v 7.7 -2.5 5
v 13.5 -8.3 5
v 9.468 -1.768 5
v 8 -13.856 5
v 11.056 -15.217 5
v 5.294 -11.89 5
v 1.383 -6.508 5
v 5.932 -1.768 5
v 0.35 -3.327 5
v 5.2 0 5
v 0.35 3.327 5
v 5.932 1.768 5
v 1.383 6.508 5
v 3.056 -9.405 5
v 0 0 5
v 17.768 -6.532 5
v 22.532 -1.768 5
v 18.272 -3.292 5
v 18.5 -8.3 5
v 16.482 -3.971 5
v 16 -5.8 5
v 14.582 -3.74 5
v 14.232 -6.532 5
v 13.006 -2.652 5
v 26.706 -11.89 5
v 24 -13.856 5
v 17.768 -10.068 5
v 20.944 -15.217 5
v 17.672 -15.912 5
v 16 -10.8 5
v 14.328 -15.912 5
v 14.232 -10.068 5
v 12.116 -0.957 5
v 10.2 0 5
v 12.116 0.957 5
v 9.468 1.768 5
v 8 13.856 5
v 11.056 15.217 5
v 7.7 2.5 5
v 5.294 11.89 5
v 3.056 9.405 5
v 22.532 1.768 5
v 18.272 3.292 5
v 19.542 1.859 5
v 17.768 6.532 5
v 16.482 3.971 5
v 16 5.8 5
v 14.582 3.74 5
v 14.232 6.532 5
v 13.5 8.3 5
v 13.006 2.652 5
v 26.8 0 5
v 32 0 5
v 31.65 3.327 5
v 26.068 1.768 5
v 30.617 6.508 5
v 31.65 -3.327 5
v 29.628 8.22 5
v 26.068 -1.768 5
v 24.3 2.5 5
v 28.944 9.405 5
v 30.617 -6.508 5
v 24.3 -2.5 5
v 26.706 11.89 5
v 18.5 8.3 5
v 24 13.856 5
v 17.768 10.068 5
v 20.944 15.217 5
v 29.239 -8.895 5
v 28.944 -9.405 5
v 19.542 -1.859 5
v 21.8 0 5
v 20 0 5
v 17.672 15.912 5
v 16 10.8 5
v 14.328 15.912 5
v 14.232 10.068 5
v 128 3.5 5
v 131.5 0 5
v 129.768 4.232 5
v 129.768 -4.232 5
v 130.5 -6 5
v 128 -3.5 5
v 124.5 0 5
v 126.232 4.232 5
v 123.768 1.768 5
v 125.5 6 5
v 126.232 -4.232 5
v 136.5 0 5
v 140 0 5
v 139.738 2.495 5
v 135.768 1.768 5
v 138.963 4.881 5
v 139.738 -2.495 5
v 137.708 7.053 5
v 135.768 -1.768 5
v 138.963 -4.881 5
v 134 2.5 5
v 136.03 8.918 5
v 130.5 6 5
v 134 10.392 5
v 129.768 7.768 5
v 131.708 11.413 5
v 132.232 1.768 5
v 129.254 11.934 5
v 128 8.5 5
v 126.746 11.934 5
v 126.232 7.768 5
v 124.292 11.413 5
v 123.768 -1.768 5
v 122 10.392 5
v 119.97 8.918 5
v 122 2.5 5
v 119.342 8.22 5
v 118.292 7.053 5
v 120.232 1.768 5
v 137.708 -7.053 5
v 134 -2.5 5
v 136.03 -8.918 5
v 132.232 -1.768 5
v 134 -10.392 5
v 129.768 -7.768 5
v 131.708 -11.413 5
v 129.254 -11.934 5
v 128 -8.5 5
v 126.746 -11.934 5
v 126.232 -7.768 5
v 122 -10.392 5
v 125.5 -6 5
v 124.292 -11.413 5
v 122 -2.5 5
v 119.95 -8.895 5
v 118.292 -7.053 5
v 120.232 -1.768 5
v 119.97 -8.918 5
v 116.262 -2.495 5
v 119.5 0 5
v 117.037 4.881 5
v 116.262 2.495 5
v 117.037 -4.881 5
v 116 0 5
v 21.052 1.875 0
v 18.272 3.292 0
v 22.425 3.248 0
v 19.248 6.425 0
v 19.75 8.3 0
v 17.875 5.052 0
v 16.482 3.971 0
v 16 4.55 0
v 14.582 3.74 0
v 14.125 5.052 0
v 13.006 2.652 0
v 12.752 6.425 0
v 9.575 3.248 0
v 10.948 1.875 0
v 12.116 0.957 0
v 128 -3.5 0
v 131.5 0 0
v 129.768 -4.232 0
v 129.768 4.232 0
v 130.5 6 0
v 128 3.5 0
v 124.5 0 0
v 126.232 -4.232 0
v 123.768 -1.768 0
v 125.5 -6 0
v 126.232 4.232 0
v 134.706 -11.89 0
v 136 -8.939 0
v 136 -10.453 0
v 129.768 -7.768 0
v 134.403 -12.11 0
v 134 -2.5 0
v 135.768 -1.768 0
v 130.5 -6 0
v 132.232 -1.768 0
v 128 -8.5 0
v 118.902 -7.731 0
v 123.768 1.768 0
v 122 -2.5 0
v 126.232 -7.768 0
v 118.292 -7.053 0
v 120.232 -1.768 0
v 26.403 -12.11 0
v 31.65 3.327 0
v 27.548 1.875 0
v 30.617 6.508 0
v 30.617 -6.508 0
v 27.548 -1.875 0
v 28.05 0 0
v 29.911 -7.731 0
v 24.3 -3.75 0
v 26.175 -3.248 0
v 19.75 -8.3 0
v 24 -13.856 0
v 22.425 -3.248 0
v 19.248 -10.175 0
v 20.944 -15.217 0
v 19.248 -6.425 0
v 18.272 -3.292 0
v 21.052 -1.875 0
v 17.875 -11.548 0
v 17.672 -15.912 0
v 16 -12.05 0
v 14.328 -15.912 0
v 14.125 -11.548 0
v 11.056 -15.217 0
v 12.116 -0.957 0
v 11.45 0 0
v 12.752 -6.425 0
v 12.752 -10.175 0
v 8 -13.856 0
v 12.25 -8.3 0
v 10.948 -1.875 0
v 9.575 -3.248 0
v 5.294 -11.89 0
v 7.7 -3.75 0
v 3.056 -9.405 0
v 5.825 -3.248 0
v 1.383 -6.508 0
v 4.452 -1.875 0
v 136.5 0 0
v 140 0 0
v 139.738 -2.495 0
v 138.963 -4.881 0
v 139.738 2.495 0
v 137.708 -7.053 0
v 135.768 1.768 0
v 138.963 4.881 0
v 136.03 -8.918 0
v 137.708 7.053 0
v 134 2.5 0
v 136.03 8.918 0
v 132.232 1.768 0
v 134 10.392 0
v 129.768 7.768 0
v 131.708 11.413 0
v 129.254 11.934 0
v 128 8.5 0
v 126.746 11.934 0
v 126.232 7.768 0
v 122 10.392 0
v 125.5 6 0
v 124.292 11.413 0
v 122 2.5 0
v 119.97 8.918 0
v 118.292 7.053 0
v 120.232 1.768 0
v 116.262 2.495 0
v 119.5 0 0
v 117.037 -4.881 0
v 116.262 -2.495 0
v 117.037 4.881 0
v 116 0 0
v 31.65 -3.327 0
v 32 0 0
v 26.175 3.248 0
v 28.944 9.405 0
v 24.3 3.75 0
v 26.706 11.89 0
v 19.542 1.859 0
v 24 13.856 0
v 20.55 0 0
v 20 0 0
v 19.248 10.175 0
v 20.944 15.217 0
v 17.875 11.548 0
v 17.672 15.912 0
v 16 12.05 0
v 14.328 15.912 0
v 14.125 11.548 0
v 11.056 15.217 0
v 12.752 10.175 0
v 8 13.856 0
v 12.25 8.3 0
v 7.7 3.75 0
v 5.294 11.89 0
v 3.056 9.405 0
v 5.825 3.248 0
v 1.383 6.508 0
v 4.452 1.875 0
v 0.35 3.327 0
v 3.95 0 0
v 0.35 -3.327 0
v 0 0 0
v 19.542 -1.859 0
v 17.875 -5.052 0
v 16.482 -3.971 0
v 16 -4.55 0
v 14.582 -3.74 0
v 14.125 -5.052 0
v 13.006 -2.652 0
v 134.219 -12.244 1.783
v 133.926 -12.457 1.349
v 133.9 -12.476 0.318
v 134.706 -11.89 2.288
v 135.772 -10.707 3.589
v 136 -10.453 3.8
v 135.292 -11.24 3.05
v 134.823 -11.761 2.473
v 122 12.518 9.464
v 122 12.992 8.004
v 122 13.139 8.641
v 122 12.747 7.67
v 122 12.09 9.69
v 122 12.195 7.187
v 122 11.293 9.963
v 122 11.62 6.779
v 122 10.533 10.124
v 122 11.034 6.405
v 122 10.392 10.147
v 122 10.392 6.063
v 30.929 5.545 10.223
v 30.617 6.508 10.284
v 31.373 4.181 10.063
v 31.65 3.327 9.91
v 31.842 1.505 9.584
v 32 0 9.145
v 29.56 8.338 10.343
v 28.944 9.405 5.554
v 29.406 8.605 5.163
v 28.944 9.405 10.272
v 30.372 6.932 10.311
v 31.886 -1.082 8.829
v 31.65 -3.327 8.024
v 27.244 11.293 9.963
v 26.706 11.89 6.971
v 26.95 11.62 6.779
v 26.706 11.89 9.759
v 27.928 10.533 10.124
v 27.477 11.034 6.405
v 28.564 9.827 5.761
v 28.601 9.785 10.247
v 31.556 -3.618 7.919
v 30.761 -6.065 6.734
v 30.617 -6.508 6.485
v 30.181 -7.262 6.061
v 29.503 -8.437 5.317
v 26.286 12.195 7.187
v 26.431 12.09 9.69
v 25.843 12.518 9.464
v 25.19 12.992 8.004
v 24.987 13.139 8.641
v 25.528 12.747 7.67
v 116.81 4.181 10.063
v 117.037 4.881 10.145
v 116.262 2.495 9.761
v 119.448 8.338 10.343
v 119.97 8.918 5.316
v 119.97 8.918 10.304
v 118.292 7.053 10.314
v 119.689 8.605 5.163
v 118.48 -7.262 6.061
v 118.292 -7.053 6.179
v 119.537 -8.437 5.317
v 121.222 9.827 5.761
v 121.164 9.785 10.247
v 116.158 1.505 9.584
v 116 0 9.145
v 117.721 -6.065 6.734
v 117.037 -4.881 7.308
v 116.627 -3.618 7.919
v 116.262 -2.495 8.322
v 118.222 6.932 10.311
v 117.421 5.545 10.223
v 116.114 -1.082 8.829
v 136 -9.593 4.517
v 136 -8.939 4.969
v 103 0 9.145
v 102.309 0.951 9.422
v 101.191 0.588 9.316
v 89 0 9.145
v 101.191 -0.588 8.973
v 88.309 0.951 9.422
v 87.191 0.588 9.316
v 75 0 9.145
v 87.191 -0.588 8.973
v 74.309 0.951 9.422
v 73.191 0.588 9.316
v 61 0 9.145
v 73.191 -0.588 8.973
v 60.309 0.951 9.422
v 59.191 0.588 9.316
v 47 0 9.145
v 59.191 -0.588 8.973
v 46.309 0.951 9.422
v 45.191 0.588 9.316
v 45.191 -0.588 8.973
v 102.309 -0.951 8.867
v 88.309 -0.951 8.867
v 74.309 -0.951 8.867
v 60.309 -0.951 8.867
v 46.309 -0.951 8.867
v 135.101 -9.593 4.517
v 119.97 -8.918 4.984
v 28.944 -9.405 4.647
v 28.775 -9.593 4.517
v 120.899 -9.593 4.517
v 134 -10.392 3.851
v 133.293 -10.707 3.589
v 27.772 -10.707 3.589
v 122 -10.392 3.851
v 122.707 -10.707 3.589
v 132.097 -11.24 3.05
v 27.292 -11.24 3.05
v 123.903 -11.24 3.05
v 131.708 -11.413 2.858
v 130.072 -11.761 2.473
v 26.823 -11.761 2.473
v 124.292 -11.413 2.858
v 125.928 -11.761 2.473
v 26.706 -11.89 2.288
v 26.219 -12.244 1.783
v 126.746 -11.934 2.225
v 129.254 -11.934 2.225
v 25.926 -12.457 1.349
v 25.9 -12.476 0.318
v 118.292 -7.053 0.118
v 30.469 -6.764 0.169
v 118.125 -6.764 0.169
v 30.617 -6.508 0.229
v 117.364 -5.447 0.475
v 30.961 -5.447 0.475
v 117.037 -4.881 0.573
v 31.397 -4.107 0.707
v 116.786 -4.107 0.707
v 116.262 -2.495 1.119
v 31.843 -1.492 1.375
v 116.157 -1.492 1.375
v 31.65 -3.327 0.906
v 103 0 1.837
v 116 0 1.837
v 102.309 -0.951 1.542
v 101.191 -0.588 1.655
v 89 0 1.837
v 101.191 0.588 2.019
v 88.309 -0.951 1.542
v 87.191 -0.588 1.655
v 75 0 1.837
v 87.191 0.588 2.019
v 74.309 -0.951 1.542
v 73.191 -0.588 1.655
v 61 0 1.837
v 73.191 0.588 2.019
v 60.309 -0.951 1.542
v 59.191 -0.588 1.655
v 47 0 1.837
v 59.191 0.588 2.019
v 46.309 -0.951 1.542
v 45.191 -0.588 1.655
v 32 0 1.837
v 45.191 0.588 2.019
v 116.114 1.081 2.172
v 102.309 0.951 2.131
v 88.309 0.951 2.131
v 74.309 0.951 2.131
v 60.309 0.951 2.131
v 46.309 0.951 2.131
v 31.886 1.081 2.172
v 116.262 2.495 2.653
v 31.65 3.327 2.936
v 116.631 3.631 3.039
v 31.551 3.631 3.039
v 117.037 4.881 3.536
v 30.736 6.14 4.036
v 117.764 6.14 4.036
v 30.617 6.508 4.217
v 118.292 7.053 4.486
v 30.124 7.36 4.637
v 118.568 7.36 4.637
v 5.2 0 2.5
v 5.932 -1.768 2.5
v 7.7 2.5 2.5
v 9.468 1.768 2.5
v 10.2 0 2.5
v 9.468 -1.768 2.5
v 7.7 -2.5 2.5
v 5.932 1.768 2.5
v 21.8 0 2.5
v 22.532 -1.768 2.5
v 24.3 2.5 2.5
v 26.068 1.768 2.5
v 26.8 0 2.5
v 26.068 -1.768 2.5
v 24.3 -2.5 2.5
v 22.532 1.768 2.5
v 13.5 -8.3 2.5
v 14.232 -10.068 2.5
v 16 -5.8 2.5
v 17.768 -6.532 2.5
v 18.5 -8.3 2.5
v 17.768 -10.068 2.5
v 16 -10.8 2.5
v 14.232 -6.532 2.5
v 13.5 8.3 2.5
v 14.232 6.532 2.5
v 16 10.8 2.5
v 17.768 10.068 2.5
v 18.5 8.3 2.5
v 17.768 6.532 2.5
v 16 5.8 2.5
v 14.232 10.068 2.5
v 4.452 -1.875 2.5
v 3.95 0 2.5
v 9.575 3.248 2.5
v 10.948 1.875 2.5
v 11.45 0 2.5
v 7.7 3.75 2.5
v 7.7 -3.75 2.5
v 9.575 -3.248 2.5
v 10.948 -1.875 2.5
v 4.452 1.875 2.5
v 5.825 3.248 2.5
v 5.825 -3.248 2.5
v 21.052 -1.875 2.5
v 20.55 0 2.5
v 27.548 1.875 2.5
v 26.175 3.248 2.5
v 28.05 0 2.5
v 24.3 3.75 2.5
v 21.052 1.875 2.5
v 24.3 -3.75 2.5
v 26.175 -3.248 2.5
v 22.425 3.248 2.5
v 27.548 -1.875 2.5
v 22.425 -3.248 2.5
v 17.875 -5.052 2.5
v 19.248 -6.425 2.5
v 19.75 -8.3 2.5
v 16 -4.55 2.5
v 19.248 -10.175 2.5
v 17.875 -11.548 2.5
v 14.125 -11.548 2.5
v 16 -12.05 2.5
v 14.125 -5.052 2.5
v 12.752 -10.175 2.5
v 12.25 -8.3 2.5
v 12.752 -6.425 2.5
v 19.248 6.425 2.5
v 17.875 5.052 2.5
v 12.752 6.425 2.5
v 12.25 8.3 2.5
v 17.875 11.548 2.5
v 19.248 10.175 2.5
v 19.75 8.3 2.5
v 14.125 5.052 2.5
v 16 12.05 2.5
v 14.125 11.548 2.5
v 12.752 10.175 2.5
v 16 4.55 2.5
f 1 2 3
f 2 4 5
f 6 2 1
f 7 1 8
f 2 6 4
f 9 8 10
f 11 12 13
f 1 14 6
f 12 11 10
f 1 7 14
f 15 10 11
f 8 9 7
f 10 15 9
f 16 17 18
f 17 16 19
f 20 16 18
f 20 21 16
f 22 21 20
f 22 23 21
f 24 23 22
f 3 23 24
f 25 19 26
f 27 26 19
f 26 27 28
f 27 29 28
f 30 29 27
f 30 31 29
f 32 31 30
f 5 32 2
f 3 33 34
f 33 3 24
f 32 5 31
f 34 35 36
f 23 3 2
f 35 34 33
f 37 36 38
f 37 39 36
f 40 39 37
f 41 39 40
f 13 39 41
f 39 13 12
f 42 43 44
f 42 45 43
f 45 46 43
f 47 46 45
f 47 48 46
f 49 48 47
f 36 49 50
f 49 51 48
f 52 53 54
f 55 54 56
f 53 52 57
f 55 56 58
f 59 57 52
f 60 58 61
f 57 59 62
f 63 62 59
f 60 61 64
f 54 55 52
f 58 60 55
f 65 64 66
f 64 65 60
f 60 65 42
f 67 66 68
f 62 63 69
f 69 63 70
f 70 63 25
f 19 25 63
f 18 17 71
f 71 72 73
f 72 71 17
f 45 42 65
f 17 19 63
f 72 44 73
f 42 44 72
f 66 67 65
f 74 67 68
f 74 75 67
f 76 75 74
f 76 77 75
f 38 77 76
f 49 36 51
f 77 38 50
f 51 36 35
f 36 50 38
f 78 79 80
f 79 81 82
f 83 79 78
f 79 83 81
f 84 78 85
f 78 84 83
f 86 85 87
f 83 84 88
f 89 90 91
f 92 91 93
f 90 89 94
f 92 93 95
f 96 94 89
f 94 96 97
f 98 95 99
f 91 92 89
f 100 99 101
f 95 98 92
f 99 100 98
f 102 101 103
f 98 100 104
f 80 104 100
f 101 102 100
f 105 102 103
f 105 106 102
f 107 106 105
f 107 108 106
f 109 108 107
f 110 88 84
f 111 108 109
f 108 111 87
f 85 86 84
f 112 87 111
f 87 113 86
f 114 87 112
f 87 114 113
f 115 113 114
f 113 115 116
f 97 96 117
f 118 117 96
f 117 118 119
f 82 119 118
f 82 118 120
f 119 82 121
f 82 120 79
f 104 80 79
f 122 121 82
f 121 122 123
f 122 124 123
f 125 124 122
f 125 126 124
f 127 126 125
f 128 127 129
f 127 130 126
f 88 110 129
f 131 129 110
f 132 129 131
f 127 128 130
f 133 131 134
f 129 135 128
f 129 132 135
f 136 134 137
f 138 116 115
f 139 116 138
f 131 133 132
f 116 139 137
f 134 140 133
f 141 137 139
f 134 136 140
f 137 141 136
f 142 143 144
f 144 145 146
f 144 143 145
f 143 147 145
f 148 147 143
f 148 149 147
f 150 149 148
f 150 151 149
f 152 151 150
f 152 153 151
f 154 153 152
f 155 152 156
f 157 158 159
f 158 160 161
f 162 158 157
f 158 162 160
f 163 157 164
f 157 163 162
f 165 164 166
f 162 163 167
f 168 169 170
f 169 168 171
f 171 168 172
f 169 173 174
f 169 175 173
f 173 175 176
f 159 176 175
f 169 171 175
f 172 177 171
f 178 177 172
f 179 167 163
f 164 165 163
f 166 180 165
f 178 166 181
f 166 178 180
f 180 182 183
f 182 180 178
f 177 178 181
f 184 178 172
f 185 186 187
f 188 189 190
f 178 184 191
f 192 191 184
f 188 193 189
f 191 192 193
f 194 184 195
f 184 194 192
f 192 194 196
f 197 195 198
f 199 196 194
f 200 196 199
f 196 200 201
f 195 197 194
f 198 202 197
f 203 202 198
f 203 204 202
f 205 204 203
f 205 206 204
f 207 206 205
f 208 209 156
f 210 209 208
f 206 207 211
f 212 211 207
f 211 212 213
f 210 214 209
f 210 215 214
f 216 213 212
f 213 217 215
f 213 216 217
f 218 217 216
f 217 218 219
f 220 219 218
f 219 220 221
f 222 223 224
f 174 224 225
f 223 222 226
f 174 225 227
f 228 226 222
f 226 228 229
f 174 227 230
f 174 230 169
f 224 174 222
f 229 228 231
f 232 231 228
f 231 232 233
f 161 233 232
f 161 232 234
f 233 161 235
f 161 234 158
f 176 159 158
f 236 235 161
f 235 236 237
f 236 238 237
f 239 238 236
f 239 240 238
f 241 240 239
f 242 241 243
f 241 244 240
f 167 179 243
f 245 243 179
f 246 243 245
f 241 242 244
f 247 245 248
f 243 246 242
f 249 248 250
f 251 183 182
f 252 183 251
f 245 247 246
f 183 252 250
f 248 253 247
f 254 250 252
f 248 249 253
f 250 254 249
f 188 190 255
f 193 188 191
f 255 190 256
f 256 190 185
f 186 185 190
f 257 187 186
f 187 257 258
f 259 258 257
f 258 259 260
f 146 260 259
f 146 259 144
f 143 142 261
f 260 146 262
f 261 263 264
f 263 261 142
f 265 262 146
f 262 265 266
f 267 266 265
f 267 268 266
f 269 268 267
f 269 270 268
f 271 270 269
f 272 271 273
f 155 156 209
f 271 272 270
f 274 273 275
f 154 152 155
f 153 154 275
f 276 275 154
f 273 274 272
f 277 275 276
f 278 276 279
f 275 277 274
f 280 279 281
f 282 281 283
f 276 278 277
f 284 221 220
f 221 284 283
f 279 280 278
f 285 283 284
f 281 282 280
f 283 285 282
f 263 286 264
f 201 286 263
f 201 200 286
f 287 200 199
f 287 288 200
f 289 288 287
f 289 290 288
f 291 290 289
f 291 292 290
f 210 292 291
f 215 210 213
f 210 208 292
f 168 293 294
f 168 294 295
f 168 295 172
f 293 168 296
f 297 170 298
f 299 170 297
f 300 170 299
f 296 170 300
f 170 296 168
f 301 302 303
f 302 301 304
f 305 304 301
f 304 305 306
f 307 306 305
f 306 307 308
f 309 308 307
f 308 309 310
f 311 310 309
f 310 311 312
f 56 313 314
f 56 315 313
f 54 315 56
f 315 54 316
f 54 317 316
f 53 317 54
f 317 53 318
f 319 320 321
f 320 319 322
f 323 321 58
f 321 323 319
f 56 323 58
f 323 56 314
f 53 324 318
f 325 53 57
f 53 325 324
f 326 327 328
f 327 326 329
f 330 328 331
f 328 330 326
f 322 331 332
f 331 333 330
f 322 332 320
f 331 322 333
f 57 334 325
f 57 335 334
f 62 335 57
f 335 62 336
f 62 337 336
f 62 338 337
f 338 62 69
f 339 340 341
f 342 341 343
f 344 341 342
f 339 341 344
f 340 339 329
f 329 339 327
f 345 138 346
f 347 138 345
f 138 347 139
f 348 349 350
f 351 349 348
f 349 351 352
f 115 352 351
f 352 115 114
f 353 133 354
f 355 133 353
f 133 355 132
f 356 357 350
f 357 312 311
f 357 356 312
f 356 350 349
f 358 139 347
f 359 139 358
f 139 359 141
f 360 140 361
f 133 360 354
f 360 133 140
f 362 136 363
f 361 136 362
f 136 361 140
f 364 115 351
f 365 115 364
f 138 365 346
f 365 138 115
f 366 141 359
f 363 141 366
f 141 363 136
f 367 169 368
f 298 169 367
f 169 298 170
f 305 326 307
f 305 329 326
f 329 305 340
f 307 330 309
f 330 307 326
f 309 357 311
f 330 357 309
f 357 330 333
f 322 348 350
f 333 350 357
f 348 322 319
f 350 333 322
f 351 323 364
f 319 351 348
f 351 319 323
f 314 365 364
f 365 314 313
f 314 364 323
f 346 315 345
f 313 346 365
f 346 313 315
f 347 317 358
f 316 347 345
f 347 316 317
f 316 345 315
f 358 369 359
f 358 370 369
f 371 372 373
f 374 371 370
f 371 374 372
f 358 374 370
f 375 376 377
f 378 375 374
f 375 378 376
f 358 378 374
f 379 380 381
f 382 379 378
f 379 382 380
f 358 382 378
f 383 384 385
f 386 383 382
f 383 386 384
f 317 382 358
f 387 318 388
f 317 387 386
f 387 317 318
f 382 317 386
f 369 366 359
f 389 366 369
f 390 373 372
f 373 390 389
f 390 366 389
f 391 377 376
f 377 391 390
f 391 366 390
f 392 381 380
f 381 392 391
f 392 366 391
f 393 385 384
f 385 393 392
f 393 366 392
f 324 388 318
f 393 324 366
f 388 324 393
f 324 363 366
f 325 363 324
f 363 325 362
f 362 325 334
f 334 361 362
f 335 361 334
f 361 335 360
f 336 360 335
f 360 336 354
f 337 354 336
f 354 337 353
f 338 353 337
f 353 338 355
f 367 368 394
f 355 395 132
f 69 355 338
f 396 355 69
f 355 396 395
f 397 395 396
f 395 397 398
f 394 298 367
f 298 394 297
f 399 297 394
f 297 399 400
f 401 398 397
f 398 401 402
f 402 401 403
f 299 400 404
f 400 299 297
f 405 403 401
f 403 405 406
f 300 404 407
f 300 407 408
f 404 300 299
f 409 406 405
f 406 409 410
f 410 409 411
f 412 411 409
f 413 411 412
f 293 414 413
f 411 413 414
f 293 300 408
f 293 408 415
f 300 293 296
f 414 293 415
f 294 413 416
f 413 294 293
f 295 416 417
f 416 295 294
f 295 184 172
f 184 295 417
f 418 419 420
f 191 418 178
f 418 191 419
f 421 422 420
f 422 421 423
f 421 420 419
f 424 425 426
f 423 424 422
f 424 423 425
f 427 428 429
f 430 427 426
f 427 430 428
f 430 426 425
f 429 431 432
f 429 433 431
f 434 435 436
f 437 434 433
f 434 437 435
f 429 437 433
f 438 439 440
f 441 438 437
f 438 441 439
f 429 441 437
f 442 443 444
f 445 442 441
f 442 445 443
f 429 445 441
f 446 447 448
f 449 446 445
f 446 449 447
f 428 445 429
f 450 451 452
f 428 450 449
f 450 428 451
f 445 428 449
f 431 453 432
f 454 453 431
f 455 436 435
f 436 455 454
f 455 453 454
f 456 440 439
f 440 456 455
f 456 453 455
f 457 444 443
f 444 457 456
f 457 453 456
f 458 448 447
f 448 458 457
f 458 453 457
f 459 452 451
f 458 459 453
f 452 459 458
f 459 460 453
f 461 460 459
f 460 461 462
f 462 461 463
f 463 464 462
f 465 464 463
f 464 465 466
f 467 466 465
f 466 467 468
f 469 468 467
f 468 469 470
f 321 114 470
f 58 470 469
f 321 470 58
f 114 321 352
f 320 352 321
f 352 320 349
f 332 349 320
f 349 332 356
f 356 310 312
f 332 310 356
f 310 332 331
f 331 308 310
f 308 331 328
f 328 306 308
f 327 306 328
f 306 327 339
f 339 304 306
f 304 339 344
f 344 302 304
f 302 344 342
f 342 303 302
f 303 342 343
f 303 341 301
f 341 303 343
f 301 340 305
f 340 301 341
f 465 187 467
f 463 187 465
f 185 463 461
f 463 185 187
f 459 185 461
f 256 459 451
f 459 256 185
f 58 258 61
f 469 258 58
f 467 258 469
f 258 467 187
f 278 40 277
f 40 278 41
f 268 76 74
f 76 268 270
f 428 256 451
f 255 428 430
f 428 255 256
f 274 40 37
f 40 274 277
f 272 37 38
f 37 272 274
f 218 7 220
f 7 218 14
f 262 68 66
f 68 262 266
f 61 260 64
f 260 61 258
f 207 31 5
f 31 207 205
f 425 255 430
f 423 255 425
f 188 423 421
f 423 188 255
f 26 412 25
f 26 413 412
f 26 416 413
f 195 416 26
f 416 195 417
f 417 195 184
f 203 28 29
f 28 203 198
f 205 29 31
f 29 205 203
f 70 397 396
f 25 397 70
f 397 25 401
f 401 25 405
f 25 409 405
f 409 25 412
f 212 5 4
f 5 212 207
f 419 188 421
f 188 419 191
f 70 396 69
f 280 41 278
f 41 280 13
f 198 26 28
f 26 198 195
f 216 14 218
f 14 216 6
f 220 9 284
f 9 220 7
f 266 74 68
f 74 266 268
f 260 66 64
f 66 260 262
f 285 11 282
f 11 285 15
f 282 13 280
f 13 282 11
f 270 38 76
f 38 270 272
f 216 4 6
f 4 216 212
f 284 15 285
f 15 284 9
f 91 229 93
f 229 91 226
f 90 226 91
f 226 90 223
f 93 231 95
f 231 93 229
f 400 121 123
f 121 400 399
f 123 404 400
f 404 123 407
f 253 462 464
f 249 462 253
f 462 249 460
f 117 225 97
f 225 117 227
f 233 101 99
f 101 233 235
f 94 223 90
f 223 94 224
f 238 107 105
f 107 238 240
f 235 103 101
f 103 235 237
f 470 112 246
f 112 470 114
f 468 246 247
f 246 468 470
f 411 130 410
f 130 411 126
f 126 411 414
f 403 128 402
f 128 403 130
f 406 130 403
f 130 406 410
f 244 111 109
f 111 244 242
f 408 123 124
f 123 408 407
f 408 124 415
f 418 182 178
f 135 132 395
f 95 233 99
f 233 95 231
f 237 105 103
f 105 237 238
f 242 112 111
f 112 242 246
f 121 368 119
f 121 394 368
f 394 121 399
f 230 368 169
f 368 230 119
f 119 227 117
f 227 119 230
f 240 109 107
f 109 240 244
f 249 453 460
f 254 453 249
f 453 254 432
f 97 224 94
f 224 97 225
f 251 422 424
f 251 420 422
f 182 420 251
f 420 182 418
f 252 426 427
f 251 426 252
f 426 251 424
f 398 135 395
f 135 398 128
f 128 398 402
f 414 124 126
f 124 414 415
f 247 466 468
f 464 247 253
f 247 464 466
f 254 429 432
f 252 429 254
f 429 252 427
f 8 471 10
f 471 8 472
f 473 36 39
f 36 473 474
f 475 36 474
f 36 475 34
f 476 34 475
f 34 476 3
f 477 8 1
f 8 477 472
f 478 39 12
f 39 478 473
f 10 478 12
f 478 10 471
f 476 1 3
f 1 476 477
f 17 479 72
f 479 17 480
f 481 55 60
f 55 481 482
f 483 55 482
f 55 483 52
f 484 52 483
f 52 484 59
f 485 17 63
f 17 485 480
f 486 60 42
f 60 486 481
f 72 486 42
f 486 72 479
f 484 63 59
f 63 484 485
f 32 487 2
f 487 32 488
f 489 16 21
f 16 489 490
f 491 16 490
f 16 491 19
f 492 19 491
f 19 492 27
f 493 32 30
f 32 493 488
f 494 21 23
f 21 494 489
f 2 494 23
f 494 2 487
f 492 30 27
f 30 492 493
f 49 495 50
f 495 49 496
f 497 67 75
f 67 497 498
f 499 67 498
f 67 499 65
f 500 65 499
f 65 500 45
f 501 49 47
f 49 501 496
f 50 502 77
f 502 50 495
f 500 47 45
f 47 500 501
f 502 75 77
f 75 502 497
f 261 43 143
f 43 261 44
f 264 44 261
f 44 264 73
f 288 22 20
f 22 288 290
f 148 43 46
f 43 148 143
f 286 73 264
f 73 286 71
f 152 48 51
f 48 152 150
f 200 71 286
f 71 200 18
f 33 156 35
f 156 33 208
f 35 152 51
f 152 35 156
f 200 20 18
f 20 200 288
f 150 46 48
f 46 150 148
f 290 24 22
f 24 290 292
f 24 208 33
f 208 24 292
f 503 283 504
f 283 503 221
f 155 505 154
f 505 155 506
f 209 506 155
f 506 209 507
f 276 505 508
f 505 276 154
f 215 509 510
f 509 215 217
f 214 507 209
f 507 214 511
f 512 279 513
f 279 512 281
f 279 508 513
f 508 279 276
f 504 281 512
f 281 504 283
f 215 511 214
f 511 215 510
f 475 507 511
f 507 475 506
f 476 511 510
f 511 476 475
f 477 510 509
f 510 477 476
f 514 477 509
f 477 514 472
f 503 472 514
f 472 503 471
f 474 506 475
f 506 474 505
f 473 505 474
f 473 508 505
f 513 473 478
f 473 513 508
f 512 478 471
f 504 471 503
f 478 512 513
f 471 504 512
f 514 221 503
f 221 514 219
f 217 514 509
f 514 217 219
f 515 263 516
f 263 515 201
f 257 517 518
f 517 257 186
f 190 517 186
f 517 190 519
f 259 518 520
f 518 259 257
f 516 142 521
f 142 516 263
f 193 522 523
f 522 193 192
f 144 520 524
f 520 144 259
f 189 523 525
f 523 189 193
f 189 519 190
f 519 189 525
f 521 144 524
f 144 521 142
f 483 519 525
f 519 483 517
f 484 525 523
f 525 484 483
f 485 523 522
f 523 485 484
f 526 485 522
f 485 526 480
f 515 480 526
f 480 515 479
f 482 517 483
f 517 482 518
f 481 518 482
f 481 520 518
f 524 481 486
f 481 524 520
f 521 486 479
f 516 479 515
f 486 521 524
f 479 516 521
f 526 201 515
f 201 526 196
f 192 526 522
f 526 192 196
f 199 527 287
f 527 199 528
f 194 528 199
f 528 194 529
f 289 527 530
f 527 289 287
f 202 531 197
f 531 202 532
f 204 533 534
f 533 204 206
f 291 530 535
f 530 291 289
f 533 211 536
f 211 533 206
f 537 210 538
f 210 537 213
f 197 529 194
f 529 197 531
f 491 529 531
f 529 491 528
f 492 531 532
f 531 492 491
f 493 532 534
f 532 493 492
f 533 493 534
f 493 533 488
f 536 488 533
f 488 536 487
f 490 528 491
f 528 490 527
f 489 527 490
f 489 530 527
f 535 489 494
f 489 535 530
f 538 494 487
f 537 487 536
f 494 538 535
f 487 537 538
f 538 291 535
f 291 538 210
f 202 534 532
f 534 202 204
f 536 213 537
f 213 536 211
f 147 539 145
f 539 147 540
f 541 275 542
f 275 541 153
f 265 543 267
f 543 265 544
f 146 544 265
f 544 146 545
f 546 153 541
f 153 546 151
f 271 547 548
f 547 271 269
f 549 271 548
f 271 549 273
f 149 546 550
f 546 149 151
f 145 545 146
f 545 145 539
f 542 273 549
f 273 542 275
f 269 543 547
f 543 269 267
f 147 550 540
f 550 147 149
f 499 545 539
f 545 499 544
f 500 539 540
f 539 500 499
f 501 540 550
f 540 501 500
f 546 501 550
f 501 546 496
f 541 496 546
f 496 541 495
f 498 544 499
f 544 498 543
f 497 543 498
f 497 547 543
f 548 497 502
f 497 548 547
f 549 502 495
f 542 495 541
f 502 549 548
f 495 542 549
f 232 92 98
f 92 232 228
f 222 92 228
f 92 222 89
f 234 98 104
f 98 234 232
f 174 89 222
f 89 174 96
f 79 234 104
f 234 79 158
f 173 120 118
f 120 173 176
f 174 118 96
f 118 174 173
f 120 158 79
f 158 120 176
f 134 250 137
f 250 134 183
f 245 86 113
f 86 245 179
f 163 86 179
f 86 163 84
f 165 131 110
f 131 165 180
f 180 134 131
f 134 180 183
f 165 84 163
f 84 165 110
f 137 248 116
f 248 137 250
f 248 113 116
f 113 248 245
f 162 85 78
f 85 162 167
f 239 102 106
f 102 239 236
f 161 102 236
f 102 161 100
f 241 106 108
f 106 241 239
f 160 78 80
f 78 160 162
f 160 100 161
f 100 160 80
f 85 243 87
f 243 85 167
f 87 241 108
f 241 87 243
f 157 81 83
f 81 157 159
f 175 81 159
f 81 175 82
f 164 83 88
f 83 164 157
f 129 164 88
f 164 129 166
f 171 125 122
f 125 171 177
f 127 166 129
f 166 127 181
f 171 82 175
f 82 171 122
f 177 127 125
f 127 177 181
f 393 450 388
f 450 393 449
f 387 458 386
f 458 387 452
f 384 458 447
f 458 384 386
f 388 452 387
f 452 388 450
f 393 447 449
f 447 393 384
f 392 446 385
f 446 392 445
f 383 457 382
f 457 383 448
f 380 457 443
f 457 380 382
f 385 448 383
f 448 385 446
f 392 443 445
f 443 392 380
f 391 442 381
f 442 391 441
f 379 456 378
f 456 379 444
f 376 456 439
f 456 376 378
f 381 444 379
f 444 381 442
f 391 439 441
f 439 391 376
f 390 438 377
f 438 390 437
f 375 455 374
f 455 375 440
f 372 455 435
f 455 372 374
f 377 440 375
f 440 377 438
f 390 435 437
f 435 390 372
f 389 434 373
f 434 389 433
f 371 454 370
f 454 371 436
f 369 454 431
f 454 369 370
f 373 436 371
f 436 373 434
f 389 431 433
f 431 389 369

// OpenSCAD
// prop radius ~128mm

module bldc() {
    cylinder(d=28, h=26);
}

// use similar to cube
module slot(l, d, h, center_x=false, center_y=false) {
    r = d/2;
    l2 = l - d;
    union() {
        if (center_x && center_y) {
            translate([-l2/2, -r]) cube([l2, r*2, h]);
            translate([l2/2, 0]) cylinder(r = r, h = h);
            translate([-l2/2, 0]) cylinder(r = r, h = h);
        } else if (center_x) {
            translate([-l2/2, 0]) cube([l2, r*2, h]);
            translate([l2/2, r]) cylinder(r = r, h = h);
            translate([-l2/2, r]) cylinder(r = r, h = h);
        } else if (center_y) {
            translate([r, -r]) cube([l2, r*2, h]);
            translate([l2+r, 0]) cylinder(r = r, h = h);
            translate([r, 0]) cylinder(r = r, h = h);
        } else {
            translate([r, 0]) cube([l2, r*2, h]);
            translate([l2+r, r]) cylinder(r = r, h = h);
            translate([r, r]) cylinder(r = r, h = h);
        }
    }
}

// nophead: http://forum.openscad.org/rounded-corners-td3843.html
module fillet_blo(r, h) {
    translate([r / 2, r / 2, h/2])
        difference() {
            cube([r + 0.01, r + 0.01, h + 0.01], center = true);
            translate([r/2, r/2, 0])
                cylinder(r = r, h = h + 0.02, center = true);
        }
}

module fillet_bro(r, h) {
    rotate([0, 0, 90]) fillet_blo(r, h);
}

module fillet_tlo(r, h) {
    rotate([0, 0, -90]) fillet_blo(r, h);
}

module fillet_tro(r, h) {
    rotate([0, 0, 180]) fillet_blo(r, h);
}

module fillet_tli(r, h) {
    rotate([0, 0, -90]) fillet_blo(r, h);
}

module fillet_tri(r, h) {
    rotate([0, 0, 180]) fillet_blo(r, h);
}

// SIKORSKY DBLN-526 AIRFOIL
// http://www.airfoiltools.com/airfoil/details?airfoil=dbln526-il
module airfoil(foil_h, arm_l, alpha) {
    pts = [
    [0.0000, 0.0000],
    [0.0125, 0.0362],
    [0.0250, 0.0491],
    [0.0500, 0.0679],
    [0.0750, 0.0823],
    [0.1000, 0.0952],
    [0.1500, 0.1152],
    [0.2000, 0.1302],
    [0.2500, 0.1430],
    [0.3000, 0.1530],
    [0.4000, 0.1668],
    [0.5000, 0.1698],
    [0.6000, 0.1668],
    [0.7000, 0.1530],
    [0.7500, 0.1430],
    [0.8000, 0.1302],
    [0.8500, 0.1152],
    [0.9000, 0.0952],
    [0.9250, 0.0823],
    [0.9500, 0.0679],
    [0.9750, 0.0491],
    [0.9875, 0.0362],
    [1.0000, 0.0000],

    [0.0000, 0.0000],
    [0.0125, -.0208],
    [0.0250, -.0298],
    [0.0500, -.0405],
    [0.0750, -.0483],
    [0.1000, -.0548],
    [0.1500, -.0637],
    [0.2000, -.0708],
    [0.2500, -.0751],
    [0.3000, -.0823],
    [0.4000, -.0887],
    [0.5000, -.0901],
    [0.6000, -.0887],
    [0.7000, -.0823],
    [0.7500, -.0751],
    [0.8000, -.0708],
    [0.8500, -.0637],
    [0.9000, -.0548],
    [0.9250, -.0483],
    [0.9500, -.0405],
    [0.9750, -.0298],
    [0.9875, -.0208],
    [1.0000, 0.0000]
    ];
    base_h = (0.1698 - -.0901);
    base_h_diff = (0.1698 - .0901);
    foil_w = foil_h / base_h;
    rotate([0, 0, 90 + alpha])
    scale([foil_w, foil_w, 1])
    translate([-0.5, -base_h_diff/2, 0])
    linear_extrude(height = arm_l) {
        polygon(pts);
    }
}

module arm() {
    bulb_d = 32;
    arm_w = 16;
    arm_t = 5;
    m_d = 16.6; // distance between mounting holes
    m_o = (bulb_d - m_d) / 2; // offset from edge for mounting holes
    m_hole_d = 8; // center hole diameter
    cham_r = 5;
    arm_l = 140;
    connect_d = 24;
    bm_d = 12; // distance between body mounting holes
    inner1_arm_l = arm_l - bulb_d/2 - connect_d/2;
    inner2_arm_l = arm_l - bulb_d - connect_d;
    screw_hole_d = 5;
    screwhead_hole_d = 7.5;
    difference() {
        //cube([140, arm_w, arm_t]);
        union() {
            // motor mounting bulb
            translate([bulb_d/2, 0, 0])
                cylinder(d=bulb_d, h=arm_t);
            
            // main arm itself
            intersection(){
                union() {
                    slot(arm_l, bulb_d, arm_t, center_y=true);
                    difference() {
                        translate([bulb_d/2, -bulb_d/2, 0])
                            cube([inner1_arm_l-connect_d/4, bulb_d, arm_t*3]);
                        translate([bulb_d/2, 0, 0])
                            cylinder(d=bulb_d, h=arm_t*3);
                        translate([arm_l-connect_d/2, 0, 0])
                            cylinder(d=connect_d, h=arm_t*3);
                    }
                }
                // foil version
                translate([bulb_d/2, 0, arm_t/2+3]) rotate([0, 90, 0]) {
                    airfoil(arm_t+2, inner1_arm_l+8, 18);
                }
                // cylinder version
                *translate([bulb_d-2, -arm_w/2+cham_r, arm_t/2]) rotate([0, 90, 0]) {
                    cylinder(r=cham_r, h=arm_l);
                    translate([0, arm_w-cham_r*2, 0])
                        cylinder(r=cham_r, h=arm_l);
                    translate([-arm_t/2, 0, 0])
                        cube([arm_t, arm_w-cham_r*2, arm_l]);
                }
            }
            // body connecting mount area
            translate([arm_l-connect_d/2, 0, 0])
                cylinder(d=connect_d, h=arm_t);
        }
        // motor mounting holes
        translate([m_o, 0, 0]) {
            cylinder(d=screw_hole_d, h=arm_t);
            translate([m_d, 0, 0])
                cylinder(d=screw_hole_d, h=arm_t);
            translate([m_d/2, -m_d/2, 0])
                cylinder(d=screw_hole_d, h=arm_t);
            translate([m_d/2, m_d/2, 0])
                cylinder(d=screw_hole_d, h=arm_t);
            translate([m_d/2, 0, 0])
                cylinder(d=m_hole_d, h=arm_t);
            // hole to allow screw head to come through part way
            cylinder(d=screwhead_hole_d, h=arm_t-2.5);
            translate([m_d, 0, 0])
                cylinder(d=screwhead_hole_d, h=arm_t-2.5);
            translate([m_d/2, -m_d/2, 0])
                cylinder(d=screwhead_hole_d, h=arm_t-2.5);
            translate([m_d/2, m_d/2, 0])
                cylinder(d=screwhead_hole_d, h=arm_t-2.5);
        }
        // body mounting holes
        translate([arm_l-connect_d/2, 0, 0]) {
            translate([bm_d/2, 0, 0])
                cylinder(d=screw_hole_d, h=arm_t);
            translate([-bm_d/2, 0, 0])
                cylinder(d=screw_hole_d, h=arm_t);
            translate([0, bm_d/2, 0])
                cylinder(d=screw_hole_d, h=arm_t);
            translate([0, -bm_d/2, 0])
                cylinder(d=screw_hole_d, h=arm_t);
        }
        
        // strengthening holes -- small enough they add density
        str_d = 2;
        inner_l = arm_l - bulb_d - connect_d;
        translate([bulb_d, 0, 0]) {
            translate([inner_l/6*1, 0, 0])
                #cylinder(d=str_d, h=arm_t*10);
            translate([inner_l/6*2, 0, 0])
                #cylinder(d=str_d, h=arm_t*10);
            translate([inner_l/6*3, 0, 0])
                #cylinder(d=str_d, h=arm_t*10);
            translate([inner_l/6*4, 0, 0])
                #cylinder(d=str_d, h=arm_t*10);
            translate([inner_l/6*5, 0, 0])
                #cylinder(d=str_d, h=arm_t*10);
        }
    }

}

//bldc();
arm();
